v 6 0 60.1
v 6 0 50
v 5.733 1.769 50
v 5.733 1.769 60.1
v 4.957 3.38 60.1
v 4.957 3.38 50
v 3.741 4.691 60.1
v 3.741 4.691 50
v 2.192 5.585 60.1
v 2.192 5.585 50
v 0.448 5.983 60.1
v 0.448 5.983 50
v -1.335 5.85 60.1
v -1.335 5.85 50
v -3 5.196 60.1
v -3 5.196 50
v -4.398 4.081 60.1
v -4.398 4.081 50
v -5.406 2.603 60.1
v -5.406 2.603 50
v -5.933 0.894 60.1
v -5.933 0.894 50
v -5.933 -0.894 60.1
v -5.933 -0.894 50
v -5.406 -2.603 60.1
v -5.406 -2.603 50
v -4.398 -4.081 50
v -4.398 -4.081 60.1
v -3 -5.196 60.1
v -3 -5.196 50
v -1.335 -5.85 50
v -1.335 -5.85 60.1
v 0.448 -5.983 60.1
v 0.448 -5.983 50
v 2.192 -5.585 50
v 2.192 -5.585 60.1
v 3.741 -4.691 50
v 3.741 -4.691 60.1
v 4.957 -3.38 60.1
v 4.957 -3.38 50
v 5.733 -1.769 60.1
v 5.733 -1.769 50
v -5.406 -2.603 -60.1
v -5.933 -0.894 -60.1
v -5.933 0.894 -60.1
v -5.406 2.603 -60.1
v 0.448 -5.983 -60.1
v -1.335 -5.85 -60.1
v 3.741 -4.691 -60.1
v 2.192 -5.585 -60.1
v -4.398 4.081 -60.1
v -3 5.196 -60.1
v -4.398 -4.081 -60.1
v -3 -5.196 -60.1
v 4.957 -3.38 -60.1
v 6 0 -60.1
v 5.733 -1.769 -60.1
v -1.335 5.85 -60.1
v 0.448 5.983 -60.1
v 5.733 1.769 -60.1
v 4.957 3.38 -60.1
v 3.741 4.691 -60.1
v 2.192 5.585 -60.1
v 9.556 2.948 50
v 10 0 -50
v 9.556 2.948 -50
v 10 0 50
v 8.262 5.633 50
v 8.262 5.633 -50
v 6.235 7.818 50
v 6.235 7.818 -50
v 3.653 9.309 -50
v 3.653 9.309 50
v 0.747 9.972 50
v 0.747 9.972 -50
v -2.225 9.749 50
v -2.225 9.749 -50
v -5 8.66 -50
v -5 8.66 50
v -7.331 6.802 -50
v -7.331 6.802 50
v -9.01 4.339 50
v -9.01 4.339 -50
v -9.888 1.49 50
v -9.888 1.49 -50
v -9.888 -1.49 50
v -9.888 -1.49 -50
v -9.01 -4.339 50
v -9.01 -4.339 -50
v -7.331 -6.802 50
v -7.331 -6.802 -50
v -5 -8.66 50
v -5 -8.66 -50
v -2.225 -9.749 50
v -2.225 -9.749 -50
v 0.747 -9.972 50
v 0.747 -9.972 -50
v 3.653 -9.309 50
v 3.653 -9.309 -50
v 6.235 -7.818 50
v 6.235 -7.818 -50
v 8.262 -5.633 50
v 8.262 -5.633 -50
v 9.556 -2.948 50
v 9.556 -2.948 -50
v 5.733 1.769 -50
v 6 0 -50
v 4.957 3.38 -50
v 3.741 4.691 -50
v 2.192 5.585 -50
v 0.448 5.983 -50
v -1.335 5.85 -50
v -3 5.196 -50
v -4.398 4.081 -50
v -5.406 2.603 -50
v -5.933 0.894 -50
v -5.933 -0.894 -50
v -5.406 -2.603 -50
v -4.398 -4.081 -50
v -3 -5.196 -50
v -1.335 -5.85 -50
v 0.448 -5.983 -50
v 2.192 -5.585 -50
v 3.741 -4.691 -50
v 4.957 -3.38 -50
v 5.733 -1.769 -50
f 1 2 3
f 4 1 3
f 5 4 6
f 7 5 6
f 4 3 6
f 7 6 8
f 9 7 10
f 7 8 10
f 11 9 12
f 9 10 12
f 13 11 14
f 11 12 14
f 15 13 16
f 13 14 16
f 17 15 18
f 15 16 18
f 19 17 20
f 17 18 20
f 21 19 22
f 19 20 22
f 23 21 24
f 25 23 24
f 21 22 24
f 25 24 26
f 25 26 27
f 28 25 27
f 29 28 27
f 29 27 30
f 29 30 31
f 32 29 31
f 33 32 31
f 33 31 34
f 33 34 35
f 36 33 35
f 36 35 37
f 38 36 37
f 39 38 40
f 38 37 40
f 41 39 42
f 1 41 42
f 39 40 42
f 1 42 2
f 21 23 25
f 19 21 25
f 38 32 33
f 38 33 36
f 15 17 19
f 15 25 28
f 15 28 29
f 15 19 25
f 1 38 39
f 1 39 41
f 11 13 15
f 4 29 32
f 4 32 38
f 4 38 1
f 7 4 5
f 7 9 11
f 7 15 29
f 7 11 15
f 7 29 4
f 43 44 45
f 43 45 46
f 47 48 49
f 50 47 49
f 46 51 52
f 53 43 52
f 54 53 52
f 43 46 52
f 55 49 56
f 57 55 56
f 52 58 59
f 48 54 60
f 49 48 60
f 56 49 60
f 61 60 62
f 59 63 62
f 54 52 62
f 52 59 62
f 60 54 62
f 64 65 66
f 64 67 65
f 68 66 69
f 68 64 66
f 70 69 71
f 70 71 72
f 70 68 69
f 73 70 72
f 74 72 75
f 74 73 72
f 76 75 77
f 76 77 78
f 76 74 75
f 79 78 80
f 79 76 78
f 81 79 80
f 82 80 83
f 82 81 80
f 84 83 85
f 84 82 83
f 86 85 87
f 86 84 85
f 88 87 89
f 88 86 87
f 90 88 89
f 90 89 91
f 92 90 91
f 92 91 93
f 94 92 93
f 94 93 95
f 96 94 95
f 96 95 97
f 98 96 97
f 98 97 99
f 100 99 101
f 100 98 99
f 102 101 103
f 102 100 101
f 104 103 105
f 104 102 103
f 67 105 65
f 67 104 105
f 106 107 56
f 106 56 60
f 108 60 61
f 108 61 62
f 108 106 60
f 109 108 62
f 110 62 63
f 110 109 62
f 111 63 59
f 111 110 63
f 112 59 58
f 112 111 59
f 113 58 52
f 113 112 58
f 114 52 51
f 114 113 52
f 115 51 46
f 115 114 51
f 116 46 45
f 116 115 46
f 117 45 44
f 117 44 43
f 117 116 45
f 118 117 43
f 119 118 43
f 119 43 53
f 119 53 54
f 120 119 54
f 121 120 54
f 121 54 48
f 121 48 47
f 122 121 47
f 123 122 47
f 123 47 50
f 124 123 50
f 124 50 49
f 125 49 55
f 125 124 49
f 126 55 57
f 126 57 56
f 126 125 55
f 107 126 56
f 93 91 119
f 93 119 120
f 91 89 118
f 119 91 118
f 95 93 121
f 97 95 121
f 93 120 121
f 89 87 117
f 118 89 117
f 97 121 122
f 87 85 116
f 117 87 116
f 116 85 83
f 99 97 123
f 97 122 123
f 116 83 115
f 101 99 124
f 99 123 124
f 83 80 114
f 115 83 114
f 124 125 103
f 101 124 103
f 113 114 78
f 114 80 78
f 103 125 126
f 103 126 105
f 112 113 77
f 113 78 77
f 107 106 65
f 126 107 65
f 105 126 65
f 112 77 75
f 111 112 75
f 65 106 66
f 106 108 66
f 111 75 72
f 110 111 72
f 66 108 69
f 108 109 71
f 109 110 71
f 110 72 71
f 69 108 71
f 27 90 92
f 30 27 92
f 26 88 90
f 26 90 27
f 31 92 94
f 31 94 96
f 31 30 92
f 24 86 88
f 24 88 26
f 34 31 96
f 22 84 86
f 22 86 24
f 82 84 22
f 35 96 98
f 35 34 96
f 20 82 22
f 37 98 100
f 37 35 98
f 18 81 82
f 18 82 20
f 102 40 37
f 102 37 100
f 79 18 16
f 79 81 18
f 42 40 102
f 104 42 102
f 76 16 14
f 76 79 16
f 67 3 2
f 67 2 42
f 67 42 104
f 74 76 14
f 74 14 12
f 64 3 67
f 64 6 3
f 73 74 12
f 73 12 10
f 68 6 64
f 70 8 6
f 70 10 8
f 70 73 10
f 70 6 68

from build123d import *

# Parameters (mm, degrees)
F0_R     = 10
F1_DEPTH = 50
F2_R     = 6
F3_DEPTH = 10.1


with BuildPart() as f1:
    # F0 (on Top) → F1 (new body, symmetric)
    with BuildSketch(Plane.XY):
        Circle(F0_R)
    extrude(amount=F1_DEPTH, both=True)

    # F2 (on face) → F3 (join)
    with BuildSketch(Plane.XY.offset(50)):
        Circle(F2_R)
    extrude(amount=F3_DEPTH)

    # F4: F1 across plane


with BuildPart() as f1_1:
    add(f1.part)
    add(f1.part.mirror(Plane.XY))


solid = f1_1.part
